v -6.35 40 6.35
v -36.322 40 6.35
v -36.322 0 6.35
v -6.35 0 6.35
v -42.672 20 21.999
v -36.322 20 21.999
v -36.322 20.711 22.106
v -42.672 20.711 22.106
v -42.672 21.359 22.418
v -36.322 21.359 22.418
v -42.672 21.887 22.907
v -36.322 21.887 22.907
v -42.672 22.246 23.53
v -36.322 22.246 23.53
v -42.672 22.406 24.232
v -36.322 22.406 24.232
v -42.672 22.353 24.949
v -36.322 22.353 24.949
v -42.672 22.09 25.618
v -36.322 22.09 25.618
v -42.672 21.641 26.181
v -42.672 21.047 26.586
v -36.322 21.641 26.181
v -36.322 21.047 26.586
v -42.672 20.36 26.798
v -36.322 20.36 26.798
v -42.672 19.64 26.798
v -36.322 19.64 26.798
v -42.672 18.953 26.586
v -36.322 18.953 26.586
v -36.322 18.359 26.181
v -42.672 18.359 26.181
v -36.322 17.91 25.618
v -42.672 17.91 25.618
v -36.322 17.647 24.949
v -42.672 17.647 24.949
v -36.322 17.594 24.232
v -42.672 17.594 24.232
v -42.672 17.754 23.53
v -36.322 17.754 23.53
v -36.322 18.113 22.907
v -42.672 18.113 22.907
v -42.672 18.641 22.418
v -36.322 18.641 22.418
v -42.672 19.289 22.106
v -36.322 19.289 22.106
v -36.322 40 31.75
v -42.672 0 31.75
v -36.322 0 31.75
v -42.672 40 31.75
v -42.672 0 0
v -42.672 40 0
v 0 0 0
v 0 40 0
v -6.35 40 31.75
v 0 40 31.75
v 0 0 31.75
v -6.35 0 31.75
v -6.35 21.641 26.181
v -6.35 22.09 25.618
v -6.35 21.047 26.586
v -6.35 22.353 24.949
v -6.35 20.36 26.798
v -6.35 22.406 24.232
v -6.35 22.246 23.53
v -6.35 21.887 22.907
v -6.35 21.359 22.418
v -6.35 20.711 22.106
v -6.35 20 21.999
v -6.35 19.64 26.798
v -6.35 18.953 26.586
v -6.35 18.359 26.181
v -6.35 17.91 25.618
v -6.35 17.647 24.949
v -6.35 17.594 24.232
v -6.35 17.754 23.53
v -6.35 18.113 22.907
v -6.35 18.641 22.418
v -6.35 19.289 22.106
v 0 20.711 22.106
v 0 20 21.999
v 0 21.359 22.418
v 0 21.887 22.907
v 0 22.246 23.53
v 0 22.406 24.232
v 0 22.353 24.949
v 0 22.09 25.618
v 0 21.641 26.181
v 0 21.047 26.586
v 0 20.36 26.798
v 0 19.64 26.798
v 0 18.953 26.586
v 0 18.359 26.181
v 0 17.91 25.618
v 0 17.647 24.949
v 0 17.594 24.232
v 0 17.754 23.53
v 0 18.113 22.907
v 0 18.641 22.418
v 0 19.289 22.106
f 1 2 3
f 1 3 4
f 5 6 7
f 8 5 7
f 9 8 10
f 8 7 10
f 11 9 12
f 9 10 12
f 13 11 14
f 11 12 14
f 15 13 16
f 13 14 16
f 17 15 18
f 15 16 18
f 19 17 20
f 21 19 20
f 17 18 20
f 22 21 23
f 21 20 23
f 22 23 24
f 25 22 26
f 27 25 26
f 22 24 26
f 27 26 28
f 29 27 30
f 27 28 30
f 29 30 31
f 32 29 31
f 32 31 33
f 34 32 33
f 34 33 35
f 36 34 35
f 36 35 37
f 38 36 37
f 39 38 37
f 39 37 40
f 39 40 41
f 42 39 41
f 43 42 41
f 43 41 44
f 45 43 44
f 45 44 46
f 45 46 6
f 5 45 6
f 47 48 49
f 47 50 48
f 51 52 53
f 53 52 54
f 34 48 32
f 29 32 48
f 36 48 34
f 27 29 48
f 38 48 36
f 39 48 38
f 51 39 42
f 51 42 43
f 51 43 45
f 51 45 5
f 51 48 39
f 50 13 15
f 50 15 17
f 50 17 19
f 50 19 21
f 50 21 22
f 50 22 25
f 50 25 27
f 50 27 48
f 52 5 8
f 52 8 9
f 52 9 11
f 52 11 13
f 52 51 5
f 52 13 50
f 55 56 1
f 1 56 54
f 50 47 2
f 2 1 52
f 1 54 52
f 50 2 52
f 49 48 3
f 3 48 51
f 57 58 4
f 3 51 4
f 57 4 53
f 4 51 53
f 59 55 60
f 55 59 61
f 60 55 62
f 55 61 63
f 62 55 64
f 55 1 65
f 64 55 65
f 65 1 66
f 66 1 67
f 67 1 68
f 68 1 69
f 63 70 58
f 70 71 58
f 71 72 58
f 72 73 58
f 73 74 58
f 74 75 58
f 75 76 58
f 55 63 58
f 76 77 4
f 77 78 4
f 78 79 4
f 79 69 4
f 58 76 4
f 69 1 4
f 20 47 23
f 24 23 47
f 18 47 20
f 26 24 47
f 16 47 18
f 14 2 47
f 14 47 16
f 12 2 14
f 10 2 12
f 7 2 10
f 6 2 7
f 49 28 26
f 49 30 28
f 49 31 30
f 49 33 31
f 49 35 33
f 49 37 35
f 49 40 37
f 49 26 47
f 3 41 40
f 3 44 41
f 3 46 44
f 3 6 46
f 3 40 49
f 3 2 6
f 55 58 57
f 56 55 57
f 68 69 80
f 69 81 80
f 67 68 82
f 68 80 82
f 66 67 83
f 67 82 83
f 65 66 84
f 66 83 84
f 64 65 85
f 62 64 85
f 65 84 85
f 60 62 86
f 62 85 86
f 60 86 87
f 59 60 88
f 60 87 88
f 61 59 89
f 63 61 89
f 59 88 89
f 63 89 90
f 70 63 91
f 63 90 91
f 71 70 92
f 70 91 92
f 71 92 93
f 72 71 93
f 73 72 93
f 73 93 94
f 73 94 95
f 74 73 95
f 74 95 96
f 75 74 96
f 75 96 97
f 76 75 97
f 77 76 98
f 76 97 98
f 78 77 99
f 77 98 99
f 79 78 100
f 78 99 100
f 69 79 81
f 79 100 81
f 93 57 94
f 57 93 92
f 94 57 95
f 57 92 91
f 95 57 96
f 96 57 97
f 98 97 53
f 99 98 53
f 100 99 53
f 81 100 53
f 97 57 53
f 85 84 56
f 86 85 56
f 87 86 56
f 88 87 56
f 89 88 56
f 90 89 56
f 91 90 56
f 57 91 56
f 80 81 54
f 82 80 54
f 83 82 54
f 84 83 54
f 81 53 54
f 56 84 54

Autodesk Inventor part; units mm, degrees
ref_plane "YZ Plane" through (0, 0, 0) normal (1, 0, 0) x (0, 1, 0)
ref_plane "XZ Plane" through (0, 0, 0) normal (0, 1, 0) x (-1, 0, 0)
ref_plane "XY Plane" through (0, 0, 0) normal (0, 0, 1) x (1, 0, 0)
sketch "Sketch1" plane through (0, 0, 0) normal (0, 0, 1) x (1, 0, 0)
  line L0 (0, 0) -> (-42.672, 0)
  line L1 (-42.672, 0) -> (-42.672, 40)
  line L2 (-42.672, 40) -> (0, 40)
  line L3 (0, 40) -> (0, 0)
  dimension "d0" = 42.672
  dimension "d1" = 40
extrude "Extrusion1" add sketch "Sketch1" along normal blind 6.35
sketch "Sketch2" plane through (0, 0, 6.35) normal (0, 0, 1) x (1, 0, 0)
  line L0 (-42.672, 0) -> (0, 0) projected
  line L1 (-42.672, 40) -> (-36.322, 40)
  line L2 (-36.322, 40) -> (-36.322, 0)
  line L3 (-36.322, 0) -> (-42.672, 0)
  line L4 (-42.672, 0) -> (-42.672, 40)
  dimension "d4" = 6.35
extrude "Extrusion2" add sketch "Sketch2" along normal blind 25.4
sketch "Sketch3" plane through (0, 0, 6.35) normal (0, 0, 1) x (1, 0, 0)
  line L0 (-36.322, 0) -> (0, 0) projected
  line L1 (0, 40) -> (-6.35, 40)
  line L2 (-6.35, 40) -> (-6.35, 0)
  line L3 (-6.35, 0) -> (0, 0)
  line L4 (0, 0) -> (0, 40)
  dimension "d7" = 6.35
extrude "Extrusion3" add sketch "Sketch3" along normal blind 25.4
sketch "Sketch4" plane through (0, 0, 0) normal (1, 0, 0) x (0, 0, -1)
  circle A0 centre (-24.4119, 20) radius 2.413
  dimension "d10" = 4.826
extrude "Extrusion4" cut sketch "Sketch4" against normal blind 76.2
properties part number "LiftBase2" material "Aluminum 6061"
